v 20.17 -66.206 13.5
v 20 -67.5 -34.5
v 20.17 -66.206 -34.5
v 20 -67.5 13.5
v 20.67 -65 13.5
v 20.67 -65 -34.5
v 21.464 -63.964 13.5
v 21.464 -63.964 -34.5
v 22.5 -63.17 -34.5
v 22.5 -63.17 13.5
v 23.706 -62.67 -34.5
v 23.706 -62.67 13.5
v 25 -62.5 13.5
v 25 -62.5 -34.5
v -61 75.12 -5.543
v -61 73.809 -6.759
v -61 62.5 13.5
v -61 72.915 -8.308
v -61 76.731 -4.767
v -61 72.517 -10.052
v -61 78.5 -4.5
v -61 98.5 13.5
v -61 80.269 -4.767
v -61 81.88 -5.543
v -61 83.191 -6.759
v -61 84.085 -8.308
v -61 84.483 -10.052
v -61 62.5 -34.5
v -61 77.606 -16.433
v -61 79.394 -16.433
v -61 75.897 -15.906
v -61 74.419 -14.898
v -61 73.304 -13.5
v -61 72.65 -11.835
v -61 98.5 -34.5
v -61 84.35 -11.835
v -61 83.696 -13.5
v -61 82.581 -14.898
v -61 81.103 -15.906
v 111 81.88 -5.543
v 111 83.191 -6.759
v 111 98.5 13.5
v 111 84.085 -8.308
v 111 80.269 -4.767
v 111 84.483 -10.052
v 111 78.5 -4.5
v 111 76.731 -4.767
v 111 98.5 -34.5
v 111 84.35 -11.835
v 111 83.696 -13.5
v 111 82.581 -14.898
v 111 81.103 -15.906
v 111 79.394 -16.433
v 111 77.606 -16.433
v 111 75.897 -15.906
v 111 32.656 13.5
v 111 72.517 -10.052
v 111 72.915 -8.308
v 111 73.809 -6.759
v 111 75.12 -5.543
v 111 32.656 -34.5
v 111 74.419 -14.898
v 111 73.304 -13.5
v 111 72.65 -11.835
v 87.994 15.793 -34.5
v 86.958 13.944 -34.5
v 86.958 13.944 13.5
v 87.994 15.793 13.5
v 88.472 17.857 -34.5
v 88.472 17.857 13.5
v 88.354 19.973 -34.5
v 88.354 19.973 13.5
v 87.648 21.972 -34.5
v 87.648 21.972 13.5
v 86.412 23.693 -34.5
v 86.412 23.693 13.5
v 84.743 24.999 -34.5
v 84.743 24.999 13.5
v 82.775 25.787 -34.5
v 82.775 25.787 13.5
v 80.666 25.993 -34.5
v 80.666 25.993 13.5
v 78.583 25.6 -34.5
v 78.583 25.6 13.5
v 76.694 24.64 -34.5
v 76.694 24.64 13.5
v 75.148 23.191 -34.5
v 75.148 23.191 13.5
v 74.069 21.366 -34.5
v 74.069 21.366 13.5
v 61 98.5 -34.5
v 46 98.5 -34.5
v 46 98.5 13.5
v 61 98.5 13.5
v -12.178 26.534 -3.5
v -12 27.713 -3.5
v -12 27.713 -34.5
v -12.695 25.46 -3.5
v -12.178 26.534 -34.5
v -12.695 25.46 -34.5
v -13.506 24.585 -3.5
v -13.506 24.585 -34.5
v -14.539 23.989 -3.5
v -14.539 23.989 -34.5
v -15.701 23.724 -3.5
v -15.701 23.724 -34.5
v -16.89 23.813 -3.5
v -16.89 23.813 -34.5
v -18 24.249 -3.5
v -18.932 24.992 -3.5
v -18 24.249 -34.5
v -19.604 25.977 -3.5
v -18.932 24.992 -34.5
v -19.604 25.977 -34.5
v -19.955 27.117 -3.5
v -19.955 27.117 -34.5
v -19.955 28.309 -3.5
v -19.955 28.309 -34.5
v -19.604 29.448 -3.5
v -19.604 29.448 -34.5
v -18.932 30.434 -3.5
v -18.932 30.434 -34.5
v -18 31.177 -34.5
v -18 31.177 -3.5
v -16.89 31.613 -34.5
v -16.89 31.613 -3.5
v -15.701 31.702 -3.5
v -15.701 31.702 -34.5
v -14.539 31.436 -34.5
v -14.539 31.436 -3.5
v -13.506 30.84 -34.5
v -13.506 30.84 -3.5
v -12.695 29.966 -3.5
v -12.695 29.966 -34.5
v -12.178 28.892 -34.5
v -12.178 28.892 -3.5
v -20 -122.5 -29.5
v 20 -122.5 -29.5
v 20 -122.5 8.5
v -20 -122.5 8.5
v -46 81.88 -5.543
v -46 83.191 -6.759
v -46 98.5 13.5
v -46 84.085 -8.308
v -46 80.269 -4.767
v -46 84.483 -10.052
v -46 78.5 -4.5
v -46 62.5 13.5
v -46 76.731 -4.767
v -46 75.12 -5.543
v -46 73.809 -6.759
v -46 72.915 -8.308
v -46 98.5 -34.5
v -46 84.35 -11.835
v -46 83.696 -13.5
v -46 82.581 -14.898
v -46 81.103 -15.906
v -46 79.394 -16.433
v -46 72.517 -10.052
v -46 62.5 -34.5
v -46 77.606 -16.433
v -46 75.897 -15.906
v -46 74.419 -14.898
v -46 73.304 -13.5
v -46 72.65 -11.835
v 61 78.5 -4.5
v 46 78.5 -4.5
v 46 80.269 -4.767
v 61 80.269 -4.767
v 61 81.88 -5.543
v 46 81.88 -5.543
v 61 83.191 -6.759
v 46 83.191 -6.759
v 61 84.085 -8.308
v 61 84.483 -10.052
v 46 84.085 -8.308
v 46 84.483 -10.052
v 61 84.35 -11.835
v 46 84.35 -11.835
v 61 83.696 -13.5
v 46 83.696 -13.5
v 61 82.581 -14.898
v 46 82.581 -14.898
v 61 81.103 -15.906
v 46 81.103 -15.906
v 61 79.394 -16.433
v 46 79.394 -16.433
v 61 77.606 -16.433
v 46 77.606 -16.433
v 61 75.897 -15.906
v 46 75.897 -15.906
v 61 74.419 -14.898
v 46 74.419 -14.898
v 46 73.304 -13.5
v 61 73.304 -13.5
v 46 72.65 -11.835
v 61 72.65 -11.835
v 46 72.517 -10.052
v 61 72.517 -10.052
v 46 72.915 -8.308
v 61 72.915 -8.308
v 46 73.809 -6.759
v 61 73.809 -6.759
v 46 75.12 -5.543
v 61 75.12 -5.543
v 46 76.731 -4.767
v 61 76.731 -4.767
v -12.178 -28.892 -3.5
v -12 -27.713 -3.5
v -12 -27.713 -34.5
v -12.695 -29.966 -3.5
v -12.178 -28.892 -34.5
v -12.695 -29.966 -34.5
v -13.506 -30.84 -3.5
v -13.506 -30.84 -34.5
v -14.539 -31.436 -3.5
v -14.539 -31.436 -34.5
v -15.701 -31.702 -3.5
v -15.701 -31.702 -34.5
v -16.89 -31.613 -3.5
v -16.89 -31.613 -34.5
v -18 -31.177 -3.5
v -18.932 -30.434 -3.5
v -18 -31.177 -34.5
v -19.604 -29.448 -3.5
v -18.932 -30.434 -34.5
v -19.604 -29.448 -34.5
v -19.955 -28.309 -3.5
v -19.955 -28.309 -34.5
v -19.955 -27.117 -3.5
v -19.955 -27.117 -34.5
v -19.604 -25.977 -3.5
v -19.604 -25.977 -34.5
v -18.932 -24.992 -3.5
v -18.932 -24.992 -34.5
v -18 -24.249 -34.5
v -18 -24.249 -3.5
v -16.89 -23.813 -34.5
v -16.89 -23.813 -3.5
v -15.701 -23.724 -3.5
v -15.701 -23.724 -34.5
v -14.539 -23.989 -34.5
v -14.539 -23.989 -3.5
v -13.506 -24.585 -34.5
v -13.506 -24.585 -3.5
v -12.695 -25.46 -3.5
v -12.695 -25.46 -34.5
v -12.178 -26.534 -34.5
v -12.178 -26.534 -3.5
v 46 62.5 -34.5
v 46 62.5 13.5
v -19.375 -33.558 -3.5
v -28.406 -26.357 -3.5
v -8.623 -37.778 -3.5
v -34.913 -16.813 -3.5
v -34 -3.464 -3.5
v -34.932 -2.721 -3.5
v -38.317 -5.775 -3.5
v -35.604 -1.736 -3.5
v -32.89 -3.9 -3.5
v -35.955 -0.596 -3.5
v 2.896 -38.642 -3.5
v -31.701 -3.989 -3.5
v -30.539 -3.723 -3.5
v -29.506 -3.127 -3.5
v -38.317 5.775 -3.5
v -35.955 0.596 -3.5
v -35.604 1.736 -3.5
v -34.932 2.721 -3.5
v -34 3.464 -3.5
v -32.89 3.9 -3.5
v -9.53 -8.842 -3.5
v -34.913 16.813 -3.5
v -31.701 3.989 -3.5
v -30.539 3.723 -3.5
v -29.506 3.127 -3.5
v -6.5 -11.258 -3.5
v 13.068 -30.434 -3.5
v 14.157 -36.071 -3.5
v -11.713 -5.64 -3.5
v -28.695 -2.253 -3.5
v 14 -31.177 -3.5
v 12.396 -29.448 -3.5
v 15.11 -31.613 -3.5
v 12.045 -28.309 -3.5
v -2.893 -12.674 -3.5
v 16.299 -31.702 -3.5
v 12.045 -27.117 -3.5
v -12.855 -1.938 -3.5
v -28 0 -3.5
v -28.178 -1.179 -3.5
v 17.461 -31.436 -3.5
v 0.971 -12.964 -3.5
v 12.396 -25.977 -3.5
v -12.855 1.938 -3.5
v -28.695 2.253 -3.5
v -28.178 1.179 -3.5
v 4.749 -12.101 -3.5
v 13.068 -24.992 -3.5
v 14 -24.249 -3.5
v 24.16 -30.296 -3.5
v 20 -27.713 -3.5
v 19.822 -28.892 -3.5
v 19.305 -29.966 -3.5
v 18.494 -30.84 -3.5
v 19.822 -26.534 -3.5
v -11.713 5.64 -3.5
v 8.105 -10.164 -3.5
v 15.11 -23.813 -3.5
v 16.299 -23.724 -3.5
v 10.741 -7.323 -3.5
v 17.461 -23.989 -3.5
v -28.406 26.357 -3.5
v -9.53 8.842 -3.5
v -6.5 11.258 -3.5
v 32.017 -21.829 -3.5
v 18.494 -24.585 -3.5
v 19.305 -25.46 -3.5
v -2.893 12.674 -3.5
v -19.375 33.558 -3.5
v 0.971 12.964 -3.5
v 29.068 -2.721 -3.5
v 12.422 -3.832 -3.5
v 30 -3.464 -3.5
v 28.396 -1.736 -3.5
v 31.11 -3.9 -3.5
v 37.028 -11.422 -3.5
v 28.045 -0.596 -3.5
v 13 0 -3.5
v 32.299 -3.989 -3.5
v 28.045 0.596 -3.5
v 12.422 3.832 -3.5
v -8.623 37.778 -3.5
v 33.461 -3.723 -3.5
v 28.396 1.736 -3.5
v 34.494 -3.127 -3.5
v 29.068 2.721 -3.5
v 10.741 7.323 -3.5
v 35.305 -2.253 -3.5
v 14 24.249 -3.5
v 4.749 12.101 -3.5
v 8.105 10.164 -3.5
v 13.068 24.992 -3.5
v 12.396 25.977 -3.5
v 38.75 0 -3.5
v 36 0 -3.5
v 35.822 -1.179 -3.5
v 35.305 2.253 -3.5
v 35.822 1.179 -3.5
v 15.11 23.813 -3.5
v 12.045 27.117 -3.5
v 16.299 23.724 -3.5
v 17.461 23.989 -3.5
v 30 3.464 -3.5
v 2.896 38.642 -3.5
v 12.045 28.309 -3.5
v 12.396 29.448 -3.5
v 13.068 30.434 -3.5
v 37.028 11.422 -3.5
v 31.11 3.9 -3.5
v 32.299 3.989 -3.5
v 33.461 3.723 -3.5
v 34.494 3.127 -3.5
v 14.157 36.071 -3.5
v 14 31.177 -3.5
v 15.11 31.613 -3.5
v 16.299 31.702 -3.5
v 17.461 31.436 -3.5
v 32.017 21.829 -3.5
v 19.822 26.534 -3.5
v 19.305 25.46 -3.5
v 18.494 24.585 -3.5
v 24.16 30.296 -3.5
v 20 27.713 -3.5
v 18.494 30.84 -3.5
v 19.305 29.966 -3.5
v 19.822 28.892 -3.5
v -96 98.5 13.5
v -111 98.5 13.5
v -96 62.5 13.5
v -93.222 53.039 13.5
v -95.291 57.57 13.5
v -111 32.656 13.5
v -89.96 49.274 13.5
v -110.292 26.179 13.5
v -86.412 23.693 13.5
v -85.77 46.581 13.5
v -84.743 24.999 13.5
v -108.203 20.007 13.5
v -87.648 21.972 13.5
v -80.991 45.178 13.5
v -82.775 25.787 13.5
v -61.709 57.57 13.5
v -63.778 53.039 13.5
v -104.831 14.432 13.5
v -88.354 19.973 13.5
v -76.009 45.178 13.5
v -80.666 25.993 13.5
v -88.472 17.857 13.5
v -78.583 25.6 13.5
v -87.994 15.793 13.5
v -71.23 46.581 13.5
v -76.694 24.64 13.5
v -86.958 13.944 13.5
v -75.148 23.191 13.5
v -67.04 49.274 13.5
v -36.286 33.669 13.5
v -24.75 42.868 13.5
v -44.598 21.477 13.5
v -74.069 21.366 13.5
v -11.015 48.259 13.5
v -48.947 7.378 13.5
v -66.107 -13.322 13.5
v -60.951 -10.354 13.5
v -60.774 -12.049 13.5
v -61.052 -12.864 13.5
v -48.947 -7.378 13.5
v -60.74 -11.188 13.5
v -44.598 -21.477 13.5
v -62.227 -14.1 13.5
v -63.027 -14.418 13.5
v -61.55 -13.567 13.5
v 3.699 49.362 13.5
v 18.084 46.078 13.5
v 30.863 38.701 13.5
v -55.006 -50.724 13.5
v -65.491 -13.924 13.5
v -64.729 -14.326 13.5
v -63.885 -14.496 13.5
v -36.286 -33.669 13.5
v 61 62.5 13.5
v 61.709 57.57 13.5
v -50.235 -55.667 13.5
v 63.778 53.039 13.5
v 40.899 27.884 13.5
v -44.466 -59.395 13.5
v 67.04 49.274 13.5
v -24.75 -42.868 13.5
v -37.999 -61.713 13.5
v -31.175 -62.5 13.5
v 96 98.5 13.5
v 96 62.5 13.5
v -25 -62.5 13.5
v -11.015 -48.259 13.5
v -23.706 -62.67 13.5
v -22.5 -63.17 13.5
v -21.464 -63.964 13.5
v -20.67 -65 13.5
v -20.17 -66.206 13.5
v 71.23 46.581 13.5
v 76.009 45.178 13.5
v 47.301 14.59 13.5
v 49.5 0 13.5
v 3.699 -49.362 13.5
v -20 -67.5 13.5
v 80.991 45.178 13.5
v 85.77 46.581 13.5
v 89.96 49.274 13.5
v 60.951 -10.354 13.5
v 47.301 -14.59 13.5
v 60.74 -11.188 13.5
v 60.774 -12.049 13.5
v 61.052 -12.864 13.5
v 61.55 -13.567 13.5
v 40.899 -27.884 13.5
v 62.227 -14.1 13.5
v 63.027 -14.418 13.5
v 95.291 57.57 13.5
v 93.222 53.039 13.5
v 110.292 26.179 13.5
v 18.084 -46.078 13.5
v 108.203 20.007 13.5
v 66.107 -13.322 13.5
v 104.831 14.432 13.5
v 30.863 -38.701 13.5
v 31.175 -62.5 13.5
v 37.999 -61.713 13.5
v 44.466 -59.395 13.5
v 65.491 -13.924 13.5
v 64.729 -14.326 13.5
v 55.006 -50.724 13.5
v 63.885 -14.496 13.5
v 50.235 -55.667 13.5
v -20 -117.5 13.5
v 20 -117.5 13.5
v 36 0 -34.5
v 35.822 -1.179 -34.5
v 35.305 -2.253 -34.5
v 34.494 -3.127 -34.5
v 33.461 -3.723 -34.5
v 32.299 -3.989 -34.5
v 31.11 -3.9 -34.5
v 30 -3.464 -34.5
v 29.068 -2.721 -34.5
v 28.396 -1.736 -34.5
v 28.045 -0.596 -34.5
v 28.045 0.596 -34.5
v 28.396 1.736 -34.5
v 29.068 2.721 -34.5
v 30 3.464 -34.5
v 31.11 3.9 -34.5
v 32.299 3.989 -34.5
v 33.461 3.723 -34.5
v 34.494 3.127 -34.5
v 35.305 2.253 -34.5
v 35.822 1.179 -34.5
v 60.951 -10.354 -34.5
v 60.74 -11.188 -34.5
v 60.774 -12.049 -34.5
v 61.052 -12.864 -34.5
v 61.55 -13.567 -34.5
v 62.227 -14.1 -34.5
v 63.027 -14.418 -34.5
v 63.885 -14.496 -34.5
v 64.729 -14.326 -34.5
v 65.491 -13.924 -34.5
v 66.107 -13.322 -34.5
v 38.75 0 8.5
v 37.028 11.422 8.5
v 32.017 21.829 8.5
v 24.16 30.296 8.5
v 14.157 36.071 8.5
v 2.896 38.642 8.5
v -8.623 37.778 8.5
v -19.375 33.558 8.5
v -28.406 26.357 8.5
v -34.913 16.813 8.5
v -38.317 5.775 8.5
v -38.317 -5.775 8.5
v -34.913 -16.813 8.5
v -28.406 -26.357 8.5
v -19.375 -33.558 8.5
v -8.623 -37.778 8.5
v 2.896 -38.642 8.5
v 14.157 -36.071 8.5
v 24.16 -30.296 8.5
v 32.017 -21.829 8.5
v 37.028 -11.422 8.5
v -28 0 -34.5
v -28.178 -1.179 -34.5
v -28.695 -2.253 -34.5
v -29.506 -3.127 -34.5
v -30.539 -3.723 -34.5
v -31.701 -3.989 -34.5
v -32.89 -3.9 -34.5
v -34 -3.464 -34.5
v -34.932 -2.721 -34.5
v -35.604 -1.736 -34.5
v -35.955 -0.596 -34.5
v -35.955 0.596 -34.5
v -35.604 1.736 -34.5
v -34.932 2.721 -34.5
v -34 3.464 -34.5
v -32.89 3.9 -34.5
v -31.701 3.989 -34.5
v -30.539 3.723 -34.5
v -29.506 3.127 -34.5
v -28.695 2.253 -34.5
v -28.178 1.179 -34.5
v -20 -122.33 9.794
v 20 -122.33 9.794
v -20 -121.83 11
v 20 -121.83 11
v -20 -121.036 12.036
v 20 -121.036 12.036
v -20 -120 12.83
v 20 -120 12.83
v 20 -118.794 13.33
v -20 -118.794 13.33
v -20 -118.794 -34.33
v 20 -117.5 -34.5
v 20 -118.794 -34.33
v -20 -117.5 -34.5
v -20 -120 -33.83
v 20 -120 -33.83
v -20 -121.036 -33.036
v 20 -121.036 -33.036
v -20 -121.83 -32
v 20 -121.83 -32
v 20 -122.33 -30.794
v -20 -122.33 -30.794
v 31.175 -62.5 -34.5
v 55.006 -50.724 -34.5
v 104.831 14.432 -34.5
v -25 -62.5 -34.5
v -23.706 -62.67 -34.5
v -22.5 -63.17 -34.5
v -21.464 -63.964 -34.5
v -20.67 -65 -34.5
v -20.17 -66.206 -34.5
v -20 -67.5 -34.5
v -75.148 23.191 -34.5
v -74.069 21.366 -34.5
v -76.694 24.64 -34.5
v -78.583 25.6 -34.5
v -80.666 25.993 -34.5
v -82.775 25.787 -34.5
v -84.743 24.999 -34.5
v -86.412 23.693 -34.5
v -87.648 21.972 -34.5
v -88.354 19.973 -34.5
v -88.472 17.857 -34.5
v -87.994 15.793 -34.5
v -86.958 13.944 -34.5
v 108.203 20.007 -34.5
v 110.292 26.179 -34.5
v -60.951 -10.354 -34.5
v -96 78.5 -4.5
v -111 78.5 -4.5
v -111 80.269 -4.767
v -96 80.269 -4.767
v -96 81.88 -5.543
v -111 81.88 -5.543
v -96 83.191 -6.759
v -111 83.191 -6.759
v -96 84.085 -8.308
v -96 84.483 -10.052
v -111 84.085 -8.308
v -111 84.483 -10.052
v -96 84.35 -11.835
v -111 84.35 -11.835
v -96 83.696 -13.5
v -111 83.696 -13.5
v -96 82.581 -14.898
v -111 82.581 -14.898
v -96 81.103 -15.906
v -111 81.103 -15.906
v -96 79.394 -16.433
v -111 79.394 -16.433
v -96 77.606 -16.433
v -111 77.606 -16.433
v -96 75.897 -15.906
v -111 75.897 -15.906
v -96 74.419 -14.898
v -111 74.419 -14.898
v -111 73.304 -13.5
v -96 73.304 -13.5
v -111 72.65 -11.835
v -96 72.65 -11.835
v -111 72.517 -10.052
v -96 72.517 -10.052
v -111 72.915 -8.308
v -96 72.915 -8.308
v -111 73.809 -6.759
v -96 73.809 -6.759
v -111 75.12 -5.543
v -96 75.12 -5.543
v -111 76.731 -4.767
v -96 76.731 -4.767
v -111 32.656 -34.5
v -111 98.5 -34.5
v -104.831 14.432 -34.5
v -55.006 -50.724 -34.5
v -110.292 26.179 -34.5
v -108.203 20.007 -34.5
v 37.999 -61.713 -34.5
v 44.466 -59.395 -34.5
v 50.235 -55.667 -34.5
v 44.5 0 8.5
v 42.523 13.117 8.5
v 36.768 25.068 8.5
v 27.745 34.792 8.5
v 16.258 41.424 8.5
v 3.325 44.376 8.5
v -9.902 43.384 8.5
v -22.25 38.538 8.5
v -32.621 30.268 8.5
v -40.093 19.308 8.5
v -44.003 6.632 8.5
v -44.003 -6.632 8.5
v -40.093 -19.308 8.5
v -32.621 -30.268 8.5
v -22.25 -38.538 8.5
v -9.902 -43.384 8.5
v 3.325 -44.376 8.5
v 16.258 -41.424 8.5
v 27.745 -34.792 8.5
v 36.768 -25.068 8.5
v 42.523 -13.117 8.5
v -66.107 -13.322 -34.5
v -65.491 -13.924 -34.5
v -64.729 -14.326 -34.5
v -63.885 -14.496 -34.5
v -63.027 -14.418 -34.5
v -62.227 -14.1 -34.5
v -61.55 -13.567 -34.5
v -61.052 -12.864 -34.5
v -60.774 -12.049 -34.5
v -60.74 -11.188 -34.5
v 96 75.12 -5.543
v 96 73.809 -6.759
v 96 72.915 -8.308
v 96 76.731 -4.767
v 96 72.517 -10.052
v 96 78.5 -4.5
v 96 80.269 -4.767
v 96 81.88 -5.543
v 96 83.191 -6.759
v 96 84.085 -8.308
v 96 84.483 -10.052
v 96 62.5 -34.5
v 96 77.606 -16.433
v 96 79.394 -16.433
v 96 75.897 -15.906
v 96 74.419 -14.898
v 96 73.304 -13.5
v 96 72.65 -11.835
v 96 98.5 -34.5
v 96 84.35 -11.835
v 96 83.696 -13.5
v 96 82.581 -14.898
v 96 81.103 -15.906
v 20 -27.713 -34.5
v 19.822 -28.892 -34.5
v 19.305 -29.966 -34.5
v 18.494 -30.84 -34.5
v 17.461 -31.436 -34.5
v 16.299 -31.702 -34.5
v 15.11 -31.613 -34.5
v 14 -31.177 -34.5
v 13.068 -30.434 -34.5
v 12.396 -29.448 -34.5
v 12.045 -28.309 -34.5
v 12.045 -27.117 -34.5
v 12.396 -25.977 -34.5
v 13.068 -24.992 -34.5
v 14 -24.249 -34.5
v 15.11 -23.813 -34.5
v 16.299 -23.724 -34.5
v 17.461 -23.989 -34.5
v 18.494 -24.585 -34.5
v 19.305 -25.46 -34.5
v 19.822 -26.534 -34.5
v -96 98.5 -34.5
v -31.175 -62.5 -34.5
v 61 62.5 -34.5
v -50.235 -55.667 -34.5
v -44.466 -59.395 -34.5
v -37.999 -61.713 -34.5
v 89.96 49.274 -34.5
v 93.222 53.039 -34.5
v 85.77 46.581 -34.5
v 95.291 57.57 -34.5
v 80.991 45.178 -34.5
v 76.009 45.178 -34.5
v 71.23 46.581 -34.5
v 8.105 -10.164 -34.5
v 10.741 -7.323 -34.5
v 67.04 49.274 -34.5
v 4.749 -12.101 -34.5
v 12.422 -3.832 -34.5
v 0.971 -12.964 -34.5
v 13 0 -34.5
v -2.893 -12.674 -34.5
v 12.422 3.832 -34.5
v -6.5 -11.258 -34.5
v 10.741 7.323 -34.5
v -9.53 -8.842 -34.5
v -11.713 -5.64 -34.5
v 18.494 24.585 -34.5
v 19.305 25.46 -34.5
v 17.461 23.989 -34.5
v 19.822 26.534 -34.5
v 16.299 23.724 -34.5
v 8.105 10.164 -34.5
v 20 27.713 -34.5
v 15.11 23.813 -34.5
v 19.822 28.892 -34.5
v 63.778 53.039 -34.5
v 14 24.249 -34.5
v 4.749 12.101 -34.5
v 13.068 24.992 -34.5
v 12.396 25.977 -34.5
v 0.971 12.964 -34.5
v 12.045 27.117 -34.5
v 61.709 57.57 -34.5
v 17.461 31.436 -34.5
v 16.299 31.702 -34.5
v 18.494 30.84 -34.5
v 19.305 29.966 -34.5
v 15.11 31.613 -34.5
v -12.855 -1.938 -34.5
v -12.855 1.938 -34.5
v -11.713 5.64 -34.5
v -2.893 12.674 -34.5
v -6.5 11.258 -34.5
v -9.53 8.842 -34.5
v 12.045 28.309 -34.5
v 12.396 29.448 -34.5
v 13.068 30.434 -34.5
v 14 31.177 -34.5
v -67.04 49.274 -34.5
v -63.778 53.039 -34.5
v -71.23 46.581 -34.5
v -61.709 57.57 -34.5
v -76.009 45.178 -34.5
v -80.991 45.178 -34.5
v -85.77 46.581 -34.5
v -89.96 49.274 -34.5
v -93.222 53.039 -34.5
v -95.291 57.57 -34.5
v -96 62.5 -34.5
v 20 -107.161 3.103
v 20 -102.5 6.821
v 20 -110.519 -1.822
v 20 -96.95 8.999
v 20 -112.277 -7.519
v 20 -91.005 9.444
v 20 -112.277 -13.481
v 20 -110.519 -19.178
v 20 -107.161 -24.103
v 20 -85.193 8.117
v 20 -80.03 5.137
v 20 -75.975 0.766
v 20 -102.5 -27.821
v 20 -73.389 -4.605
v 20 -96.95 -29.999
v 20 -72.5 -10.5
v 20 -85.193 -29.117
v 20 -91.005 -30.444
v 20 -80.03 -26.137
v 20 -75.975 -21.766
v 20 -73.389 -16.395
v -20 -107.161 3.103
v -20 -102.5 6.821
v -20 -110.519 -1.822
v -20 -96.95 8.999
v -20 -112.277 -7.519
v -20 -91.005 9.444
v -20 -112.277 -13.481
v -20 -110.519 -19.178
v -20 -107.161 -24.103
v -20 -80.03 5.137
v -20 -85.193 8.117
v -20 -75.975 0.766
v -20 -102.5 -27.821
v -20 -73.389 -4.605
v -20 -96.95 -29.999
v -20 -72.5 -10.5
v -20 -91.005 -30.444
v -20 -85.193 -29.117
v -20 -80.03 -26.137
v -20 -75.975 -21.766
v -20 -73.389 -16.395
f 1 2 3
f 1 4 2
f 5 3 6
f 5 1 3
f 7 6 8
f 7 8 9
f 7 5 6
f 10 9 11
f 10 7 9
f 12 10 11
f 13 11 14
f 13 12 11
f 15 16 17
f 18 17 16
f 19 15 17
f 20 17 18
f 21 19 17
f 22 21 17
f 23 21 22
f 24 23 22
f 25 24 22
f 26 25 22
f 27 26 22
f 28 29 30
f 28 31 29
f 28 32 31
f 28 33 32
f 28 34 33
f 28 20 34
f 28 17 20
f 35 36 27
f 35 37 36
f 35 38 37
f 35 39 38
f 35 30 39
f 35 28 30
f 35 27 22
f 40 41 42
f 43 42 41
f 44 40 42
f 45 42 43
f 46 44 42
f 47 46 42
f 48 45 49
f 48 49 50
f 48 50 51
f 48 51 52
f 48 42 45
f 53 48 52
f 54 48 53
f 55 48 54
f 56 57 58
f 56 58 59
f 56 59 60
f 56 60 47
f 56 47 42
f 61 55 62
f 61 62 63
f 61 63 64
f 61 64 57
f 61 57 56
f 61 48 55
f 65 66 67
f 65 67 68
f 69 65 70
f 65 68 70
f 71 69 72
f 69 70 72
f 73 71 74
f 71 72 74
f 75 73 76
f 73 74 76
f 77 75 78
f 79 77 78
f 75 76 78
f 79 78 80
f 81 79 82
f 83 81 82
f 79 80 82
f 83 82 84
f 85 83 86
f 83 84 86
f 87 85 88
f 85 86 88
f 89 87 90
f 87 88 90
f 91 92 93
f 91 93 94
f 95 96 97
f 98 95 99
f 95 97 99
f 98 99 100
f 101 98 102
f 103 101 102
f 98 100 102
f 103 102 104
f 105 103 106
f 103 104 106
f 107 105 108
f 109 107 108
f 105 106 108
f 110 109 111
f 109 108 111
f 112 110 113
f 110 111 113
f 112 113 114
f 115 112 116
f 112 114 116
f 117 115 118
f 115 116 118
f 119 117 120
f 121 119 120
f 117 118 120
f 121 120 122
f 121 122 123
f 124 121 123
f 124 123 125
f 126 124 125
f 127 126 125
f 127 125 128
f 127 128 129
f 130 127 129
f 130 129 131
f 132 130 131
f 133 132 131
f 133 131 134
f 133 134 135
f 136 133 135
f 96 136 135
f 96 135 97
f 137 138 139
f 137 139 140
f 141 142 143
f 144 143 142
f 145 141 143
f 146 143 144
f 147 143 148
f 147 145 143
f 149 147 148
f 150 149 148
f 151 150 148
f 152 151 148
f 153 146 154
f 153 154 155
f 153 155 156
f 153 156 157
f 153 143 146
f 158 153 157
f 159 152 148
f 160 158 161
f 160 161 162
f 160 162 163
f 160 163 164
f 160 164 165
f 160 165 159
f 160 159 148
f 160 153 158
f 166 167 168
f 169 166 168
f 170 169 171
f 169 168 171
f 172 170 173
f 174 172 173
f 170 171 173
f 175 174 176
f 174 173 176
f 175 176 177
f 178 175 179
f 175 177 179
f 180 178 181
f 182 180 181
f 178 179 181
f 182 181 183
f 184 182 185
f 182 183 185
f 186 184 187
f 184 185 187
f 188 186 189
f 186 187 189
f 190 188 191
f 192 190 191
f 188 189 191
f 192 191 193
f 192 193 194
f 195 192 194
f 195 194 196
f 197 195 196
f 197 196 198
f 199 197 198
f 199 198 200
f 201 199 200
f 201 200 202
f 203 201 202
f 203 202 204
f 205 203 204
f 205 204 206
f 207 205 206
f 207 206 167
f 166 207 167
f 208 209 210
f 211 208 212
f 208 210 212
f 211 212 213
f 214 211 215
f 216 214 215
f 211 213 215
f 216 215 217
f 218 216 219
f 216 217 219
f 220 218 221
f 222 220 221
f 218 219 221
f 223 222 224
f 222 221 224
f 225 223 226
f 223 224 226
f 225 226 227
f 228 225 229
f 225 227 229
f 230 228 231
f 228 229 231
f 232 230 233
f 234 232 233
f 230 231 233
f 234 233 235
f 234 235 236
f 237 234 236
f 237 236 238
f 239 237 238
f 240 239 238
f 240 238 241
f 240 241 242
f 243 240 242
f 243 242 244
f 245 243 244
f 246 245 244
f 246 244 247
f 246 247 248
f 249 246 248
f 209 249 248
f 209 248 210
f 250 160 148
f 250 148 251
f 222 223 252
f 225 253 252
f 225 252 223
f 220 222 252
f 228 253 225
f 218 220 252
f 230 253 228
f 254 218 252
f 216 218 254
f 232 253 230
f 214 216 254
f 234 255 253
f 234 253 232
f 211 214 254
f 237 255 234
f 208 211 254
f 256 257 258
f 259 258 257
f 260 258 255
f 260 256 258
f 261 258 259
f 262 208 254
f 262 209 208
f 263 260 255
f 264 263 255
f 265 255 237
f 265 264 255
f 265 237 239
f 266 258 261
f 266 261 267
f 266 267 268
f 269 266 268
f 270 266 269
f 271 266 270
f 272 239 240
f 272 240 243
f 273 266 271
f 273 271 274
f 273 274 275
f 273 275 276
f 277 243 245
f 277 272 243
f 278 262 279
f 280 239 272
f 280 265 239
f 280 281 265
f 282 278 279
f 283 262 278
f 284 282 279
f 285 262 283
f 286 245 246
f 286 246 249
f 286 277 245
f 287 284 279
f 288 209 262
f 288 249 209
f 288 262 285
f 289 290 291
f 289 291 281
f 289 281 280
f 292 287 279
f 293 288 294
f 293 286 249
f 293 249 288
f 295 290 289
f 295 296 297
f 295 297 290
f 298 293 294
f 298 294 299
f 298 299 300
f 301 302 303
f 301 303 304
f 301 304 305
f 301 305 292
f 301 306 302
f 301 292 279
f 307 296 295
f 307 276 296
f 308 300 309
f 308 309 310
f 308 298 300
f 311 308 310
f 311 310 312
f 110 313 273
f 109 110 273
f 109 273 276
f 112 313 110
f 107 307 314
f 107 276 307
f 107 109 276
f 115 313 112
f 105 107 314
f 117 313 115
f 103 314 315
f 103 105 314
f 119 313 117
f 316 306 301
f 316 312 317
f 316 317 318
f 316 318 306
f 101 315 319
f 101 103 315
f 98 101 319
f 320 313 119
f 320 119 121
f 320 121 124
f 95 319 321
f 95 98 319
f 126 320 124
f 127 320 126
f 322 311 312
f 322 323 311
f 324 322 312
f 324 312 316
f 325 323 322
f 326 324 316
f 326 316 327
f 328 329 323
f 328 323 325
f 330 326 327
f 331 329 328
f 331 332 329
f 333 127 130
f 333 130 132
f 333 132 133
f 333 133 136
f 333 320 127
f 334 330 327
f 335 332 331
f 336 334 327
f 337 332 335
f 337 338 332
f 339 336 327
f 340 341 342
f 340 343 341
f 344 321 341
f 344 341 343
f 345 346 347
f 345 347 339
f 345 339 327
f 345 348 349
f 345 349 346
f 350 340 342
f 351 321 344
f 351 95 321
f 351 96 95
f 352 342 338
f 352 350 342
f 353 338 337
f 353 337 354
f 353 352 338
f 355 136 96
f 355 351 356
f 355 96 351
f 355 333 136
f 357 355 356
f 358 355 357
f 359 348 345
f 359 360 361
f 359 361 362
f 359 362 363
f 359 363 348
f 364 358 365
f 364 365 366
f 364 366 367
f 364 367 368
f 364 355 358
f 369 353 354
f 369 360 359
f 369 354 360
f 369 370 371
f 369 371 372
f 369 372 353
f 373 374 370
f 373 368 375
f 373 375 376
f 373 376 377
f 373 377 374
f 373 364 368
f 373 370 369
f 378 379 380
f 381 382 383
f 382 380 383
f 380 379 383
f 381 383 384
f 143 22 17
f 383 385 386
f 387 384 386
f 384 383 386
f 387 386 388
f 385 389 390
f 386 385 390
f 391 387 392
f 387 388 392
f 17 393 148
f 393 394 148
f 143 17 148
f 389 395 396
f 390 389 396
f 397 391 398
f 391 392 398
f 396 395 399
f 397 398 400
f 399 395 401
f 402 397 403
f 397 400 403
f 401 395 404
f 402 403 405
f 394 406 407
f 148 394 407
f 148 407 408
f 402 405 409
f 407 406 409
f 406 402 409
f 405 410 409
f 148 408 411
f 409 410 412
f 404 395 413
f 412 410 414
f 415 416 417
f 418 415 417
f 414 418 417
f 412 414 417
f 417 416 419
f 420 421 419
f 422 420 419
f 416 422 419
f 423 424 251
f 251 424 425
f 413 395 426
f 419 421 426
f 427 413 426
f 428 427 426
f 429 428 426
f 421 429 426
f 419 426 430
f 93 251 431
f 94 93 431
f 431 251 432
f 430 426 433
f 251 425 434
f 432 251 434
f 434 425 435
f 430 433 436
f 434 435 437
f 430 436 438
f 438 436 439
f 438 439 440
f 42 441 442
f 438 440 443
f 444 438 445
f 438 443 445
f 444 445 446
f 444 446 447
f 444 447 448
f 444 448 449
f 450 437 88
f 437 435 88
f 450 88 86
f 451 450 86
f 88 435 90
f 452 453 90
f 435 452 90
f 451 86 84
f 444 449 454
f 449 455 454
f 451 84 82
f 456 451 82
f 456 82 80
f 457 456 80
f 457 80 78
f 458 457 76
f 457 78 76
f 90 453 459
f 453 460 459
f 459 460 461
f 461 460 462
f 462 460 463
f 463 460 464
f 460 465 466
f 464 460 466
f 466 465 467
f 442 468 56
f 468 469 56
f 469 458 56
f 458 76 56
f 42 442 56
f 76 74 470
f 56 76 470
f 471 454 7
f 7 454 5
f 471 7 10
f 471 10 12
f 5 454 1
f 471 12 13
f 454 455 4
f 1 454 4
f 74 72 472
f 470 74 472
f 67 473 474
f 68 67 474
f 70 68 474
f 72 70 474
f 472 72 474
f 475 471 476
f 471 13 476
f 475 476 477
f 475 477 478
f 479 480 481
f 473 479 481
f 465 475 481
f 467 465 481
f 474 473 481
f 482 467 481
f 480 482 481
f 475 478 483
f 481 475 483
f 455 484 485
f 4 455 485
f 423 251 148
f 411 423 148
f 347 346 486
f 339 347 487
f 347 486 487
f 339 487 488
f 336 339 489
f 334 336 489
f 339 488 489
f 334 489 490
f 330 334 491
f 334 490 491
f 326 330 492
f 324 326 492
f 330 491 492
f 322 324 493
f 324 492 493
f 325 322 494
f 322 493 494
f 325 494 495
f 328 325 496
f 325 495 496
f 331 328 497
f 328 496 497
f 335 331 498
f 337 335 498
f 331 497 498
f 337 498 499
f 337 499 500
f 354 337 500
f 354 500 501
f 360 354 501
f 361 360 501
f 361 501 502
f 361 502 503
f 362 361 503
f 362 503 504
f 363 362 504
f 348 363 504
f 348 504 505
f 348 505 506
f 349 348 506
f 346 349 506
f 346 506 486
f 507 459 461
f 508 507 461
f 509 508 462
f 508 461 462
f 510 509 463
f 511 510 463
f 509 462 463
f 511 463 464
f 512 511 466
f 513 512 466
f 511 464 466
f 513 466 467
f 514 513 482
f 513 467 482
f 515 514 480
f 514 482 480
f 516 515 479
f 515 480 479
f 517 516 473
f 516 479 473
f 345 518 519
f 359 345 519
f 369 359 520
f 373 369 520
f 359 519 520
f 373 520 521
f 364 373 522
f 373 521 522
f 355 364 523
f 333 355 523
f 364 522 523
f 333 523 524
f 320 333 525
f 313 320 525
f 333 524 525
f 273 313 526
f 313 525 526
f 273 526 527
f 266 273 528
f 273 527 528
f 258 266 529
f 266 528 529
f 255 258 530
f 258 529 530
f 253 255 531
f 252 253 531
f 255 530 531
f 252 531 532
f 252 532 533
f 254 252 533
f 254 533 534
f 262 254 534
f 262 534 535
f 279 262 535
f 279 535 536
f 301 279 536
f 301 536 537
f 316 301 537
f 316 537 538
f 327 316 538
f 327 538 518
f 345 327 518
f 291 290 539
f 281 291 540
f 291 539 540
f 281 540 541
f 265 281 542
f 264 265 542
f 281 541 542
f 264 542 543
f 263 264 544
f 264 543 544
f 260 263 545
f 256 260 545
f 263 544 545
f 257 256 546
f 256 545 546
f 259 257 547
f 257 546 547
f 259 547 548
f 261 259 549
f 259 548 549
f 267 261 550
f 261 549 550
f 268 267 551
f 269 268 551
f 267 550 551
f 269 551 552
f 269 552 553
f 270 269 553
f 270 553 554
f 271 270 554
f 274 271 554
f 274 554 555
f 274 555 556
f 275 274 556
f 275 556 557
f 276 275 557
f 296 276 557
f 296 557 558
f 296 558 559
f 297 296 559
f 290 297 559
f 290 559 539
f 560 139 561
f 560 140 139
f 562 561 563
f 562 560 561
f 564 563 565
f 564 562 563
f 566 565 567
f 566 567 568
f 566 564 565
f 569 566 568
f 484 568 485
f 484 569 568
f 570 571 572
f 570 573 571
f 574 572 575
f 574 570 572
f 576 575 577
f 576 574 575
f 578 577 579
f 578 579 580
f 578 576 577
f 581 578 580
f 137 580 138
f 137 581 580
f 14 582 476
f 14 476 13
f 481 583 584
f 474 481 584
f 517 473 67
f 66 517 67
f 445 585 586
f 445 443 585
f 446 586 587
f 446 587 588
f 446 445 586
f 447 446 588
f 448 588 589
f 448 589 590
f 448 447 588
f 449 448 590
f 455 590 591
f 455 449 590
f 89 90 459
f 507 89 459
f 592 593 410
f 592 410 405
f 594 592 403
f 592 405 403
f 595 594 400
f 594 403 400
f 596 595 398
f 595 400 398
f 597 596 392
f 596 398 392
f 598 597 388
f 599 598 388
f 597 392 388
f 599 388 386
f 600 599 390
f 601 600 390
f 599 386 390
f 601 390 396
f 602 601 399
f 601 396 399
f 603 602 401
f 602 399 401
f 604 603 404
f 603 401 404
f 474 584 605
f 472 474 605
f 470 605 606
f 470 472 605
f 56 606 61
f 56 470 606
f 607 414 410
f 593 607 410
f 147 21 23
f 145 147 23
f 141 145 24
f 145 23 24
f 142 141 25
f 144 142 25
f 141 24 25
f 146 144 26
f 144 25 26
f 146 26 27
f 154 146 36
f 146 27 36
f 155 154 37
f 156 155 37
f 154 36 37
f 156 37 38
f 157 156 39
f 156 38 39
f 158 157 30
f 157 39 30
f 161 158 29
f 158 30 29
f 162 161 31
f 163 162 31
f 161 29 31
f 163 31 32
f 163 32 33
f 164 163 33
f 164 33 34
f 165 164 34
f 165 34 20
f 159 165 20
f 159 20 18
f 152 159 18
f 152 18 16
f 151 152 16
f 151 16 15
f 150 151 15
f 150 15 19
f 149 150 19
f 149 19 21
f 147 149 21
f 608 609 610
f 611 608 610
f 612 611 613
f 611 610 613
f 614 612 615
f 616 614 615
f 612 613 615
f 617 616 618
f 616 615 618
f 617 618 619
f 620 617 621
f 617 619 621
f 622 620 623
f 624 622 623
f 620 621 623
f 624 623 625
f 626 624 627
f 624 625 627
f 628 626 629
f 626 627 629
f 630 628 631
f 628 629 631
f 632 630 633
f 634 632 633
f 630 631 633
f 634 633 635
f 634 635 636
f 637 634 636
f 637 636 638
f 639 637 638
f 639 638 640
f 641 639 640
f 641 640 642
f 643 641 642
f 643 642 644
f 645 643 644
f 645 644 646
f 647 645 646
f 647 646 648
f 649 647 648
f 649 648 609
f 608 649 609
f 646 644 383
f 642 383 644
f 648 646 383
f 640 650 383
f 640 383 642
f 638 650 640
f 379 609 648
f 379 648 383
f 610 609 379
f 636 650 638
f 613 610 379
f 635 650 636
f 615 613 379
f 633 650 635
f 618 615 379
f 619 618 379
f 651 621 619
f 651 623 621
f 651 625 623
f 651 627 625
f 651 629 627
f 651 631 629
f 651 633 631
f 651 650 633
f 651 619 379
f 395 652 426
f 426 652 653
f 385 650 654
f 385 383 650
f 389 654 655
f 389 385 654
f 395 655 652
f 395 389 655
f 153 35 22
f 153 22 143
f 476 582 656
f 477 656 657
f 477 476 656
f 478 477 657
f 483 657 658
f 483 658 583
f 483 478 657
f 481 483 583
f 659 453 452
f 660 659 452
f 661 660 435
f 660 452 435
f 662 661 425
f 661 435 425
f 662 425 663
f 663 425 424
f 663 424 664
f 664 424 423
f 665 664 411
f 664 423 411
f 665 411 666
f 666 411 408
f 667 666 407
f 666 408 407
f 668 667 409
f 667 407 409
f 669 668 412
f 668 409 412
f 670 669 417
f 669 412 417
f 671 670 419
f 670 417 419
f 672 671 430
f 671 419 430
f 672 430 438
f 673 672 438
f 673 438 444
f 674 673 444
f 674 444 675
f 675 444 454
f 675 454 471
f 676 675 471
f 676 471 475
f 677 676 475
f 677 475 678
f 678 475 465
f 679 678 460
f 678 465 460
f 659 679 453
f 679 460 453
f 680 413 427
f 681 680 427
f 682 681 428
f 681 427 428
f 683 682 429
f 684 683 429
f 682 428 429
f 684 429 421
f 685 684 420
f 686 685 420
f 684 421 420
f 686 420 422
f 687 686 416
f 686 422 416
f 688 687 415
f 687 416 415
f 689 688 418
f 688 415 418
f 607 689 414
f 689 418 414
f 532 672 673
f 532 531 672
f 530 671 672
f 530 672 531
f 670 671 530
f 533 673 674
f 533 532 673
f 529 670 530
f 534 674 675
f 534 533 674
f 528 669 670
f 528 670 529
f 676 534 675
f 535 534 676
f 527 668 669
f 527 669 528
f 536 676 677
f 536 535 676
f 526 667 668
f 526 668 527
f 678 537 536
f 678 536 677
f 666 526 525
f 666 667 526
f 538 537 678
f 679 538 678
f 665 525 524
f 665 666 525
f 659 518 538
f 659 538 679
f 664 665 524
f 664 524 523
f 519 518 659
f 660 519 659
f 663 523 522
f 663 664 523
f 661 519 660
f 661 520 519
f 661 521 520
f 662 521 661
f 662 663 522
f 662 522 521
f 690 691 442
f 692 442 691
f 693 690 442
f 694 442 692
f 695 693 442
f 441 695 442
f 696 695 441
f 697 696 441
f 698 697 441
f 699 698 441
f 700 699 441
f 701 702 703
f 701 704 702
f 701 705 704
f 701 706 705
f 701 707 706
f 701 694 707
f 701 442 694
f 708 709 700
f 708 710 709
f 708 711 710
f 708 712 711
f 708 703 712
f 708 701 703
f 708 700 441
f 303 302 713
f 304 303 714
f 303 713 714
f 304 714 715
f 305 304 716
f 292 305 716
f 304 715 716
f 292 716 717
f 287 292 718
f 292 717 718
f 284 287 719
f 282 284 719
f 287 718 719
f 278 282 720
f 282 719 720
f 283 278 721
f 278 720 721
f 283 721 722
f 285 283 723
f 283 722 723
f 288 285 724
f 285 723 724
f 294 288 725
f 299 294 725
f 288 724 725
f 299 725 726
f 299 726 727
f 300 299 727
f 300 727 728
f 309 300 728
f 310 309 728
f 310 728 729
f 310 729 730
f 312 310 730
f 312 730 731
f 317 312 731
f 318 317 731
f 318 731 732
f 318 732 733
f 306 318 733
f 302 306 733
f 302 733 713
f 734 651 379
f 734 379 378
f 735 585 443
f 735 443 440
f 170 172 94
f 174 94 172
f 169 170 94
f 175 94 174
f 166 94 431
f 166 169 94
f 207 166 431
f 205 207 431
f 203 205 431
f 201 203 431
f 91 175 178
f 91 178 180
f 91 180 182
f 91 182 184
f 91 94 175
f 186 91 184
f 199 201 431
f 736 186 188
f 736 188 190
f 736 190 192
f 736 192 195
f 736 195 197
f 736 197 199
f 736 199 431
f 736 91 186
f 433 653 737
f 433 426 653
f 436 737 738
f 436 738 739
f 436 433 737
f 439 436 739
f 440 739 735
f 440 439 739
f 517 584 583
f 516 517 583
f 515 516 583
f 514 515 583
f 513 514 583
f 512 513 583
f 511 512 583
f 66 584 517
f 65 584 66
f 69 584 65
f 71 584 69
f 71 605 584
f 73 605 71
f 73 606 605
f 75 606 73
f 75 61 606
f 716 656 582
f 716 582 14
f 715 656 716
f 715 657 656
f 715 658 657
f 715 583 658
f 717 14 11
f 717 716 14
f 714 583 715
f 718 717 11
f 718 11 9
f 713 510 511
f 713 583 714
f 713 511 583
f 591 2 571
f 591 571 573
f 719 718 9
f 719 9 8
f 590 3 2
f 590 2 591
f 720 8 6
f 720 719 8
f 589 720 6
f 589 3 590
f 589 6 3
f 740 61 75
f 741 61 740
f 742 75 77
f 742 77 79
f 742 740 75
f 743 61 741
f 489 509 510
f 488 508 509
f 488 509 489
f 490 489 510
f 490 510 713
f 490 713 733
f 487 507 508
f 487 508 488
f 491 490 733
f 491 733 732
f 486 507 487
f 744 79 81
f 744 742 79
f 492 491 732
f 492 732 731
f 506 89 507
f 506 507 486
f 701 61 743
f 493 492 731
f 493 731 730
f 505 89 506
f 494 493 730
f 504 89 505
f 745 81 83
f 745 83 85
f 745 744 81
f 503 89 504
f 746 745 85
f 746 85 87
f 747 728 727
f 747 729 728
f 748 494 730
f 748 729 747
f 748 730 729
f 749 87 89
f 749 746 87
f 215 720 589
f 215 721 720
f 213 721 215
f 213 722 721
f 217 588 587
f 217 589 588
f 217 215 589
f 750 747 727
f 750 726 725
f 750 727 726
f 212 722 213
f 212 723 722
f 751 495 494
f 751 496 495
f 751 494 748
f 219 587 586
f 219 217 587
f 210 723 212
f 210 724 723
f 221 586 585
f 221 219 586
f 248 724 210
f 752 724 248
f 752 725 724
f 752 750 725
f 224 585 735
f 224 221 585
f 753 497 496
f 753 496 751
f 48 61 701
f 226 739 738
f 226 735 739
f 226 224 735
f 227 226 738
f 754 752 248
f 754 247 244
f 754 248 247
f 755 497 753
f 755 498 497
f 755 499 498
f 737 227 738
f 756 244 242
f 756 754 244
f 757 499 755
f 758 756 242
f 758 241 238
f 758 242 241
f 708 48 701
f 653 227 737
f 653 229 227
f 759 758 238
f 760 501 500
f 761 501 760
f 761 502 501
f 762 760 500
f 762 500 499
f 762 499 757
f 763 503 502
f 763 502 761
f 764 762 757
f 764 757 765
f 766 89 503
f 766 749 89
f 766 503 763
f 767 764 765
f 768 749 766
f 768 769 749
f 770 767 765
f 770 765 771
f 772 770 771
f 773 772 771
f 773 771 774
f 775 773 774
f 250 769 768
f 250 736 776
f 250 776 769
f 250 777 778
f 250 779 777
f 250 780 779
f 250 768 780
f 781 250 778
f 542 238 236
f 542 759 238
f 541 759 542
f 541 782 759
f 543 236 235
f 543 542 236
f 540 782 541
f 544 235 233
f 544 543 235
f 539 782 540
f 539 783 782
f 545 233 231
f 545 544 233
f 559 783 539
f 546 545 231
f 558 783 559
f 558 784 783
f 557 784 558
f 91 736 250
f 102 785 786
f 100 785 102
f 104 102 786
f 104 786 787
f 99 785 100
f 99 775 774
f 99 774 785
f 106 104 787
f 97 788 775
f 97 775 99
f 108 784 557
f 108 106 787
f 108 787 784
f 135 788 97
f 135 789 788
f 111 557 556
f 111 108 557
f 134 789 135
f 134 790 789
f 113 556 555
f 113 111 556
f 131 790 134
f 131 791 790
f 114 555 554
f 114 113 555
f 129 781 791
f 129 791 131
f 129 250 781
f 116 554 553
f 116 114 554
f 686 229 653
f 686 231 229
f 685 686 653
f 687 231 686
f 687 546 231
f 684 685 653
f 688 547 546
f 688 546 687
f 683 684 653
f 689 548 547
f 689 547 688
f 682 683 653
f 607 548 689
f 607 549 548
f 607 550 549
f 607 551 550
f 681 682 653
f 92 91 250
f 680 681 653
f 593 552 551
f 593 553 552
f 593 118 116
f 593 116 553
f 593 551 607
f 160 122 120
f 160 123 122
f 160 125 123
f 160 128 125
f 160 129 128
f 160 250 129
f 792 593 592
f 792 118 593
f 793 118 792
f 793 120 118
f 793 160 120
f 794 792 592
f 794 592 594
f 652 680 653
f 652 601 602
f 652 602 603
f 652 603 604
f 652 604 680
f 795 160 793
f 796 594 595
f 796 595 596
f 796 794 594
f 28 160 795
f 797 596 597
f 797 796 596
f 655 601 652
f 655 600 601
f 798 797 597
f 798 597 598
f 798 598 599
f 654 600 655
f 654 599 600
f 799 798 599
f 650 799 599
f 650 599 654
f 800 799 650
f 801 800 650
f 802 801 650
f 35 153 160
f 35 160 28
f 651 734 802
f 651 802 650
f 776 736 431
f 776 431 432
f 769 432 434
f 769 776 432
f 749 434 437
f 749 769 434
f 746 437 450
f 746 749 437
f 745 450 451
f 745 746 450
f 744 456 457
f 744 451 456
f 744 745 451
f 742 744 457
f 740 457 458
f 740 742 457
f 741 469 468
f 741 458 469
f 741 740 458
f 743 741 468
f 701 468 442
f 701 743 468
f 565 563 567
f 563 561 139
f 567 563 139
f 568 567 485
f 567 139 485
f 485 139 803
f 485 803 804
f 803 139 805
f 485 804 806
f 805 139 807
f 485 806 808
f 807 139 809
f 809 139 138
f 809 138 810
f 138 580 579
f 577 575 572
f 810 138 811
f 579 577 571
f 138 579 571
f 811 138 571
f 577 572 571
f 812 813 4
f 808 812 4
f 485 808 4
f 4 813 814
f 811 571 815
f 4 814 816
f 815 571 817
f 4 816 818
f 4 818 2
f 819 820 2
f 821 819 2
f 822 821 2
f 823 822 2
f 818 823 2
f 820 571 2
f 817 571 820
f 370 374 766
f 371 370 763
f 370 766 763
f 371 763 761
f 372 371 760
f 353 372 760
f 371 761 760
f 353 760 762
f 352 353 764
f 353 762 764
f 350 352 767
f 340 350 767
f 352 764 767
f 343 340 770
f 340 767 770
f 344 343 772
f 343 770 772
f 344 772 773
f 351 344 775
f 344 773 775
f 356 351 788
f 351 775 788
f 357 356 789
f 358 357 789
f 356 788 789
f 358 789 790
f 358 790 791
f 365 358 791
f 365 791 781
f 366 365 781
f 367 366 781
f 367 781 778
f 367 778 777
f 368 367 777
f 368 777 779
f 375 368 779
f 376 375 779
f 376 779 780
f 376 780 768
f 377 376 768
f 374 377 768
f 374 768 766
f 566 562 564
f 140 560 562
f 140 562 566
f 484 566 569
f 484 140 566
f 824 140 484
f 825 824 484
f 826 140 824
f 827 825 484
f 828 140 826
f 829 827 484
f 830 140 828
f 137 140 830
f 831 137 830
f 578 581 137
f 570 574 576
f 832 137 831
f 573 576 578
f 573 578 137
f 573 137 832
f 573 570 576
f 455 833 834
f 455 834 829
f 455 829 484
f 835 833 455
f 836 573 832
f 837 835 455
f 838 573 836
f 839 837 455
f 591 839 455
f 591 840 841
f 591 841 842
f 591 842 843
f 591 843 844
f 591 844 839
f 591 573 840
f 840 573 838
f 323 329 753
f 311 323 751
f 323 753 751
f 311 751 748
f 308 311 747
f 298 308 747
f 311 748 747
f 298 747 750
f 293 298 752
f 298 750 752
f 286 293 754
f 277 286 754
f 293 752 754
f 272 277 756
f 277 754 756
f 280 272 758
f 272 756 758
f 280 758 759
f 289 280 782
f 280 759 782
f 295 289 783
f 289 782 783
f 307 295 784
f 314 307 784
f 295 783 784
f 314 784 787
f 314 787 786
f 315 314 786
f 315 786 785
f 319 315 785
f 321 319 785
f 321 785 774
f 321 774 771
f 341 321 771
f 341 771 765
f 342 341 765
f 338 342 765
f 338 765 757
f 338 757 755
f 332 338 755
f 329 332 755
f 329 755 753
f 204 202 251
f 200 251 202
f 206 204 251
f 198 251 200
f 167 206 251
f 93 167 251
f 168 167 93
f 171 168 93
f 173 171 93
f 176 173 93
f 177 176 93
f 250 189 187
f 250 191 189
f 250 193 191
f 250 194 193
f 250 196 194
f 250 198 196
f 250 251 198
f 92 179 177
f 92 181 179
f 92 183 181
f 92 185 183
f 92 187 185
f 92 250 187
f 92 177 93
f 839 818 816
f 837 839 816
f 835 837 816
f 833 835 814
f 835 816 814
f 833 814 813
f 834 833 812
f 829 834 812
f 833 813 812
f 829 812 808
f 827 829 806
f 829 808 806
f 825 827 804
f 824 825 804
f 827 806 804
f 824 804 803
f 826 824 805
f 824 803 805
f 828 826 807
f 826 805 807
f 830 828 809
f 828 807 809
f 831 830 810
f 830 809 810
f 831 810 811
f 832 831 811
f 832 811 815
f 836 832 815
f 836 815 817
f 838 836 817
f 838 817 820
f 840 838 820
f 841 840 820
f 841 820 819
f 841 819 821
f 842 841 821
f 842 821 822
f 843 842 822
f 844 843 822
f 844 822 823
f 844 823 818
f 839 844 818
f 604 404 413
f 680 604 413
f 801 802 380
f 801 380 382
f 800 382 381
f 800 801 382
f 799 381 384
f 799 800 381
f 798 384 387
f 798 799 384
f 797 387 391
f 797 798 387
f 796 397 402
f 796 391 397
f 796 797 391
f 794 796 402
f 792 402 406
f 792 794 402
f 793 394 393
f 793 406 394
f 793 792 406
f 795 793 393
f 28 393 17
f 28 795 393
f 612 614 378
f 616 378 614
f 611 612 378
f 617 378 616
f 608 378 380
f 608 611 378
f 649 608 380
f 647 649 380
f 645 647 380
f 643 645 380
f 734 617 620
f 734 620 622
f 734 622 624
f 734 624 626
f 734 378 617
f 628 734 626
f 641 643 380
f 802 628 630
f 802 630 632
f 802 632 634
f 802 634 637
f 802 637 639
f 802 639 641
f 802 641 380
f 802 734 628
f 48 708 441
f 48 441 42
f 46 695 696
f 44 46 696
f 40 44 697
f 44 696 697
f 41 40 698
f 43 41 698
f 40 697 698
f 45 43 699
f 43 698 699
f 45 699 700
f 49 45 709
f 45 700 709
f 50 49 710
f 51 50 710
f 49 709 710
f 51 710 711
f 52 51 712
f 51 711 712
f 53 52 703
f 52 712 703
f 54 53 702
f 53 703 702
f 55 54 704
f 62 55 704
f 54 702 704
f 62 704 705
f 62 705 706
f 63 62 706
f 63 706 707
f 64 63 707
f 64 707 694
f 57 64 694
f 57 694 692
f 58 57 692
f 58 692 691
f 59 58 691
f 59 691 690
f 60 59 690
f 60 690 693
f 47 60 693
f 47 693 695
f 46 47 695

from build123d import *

# Parameters (mm, degrees)
DODANIE_WYCI_GNI_CIE1_DEPTH      = 13.5
DODANIE_WYCI_GNI_CIE1_DEPTH_BACK = 13.5
SZKIC1_W                         = 222
SZKIC1_H                         = 125
SZKIC1_R                         = 13
SZKIC1_R_2                       = 4
SZKIC4_W                         = 15
SZKIC4_H                         = 27
DODANIE_WYCI_GNI_CIE4_DEPTH      = 36
SZKIC13_R                        = 38.75
WYTNIJ_WYCI_GNI_CIE4_DEPTH       = 17
SZKIC15_R                        = 44.5
WYTNIJ_WYCI_GNI_CIE5_DEPTH       = 5
POCHYLENIE1_ANGLE                = 45
DODANIE_WYCI_GNI_CIE6_START      = 21
SZKIC16_R                        = 13
SZKIC16_R_2                      = 4
DODANIE_WYCI_GNI_CIE6_DEPTH      = 21
SZKIC5_R                         = 6
WYTNIJ_WYCI_GNI_CIE3_DEPTH       = 246.308988828
WYTNIJ_WYCI_GNI_CIE6_DEPTH       = 156.971952607
ZAOKR_GLENIE1_R                  = 30
ZAOKR_GLENIE2_R                  = 30
SZKIC19_W                        = 40
SZKIC19_H                        = 60
DODANIE_WYCI_GNI_CIE7_DEPTH      = 48
WYTNIJ_WYCI_GNI_CIE7_REACH       = 184.64
SZKIC23_R                        = 20
WYTNIJ_WYCI_GNI_CIE8_REACH       = 174.137
ZAOKR_GLENIE4_R                  = 5
ZAOKR_GLENIE5_R                  = 5
WYTNIJ_WYCI_GNI_CIE9_DEPTH       = 48


with BuildPart() as part:
    # Szkic1 → Dodanie-wyciągnięcie1 (new, two sides: drawn at the far end of the back side and taken through both)
    with BuildSketch(Plane.XY.offset(-DODANIE_WYCI_GNI_CIE1_DEPTH_BACK)):
        Rectangle(SZKIC1_W, SZKIC1_H)
        Circle(SZKIC1_R, mode=Mode.SUBTRACT)
        with Locations((-32, 0)):
            Circle(SZKIC1_R_2, mode=Mode.SUBTRACT)
        with Locations((-16, 27.712812921)):
            Circle(SZKIC1_R_2, mode=Mode.SUBTRACT)
        with Locations((16, 27.712812921)):
            Circle(SZKIC1_R_2, mode=Mode.SUBTRACT)
        with Locations((32, 0)):
            Circle(SZKIC1_R_2, mode=Mode.SUBTRACT)
        with Locations((16, -27.712812921)):
            Circle(SZKIC1_R_2, mode=Mode.SUBTRACT)
        with Locations((-16, -27.712812921)):
            Circle(SZKIC1_R_2, mode=Mode.SUBTRACT)
    extrude(amount=DODANIE_WYCI_GNI_CIE1_DEPTH + DODANIE_WYCI_GNI_CIE1_DEPTH_BACK)

    # Szkic4 → Dodanie-wyciągnięcie4 (add)
    with BuildSketch(Plane(origin=(0, 62.5, 0), x_dir=(1, 0, 0), z_dir=(0, 1, 0))):
        with Locations((-103.5, 0)):
            Rectangle(SZKIC4_W, SZKIC4_H)
        with Locations((-53.5, 0)):
            Rectangle(SZKIC4_W, SZKIC4_H)
        with Locations((53.5, 0)):
            Rectangle(SZKIC4_W, SZKIC4_H)
        with Locations((103.5, 0)):
            Rectangle(SZKIC4_W, SZKIC4_H)
    extrude(amount=DODANIE_WYCI_GNI_CIE4_DEPTH)

    # Szkic13 → Wytnij-wyciągnięcie4 (cut)
    with BuildSketch(Plane.XY.offset(13.5)):
        Circle(SZKIC13_R)
    extrude(amount=-WYTNIJ_WYCI_GNI_CIE4_DEPTH, mode=Mode.SUBTRACT)

    # Szkic15 → Wytnij-wyciągnięcie5 (cut)
    with BuildSketch(Plane.XY.offset(13.5)):
        Circle(SZKIC15_R)
    extrude(amount=-WYTNIJ_WYCI_GNI_CIE5_DEPTH, mode=Mode.SUBTRACT)

    # Pochylenie1
    pochylenie1_faces = [part.faces().sort_by_distance(p)[0] for p in [
        (-44.5, 0, 11),
    ]]
    draft(pochylenie1_faces, Plane.XY.offset(8.5), POCHYLENIE1_ANGLE)

    # Szkic16 → Dodanie-wyciągnięcie6 (add)
    with BuildSketch(Plane(origin=(0, 0, -13.5), x_dir=(-1, 0, 0), z_dir=(0, 0, -1)).offset(DODANIE_WYCI_GNI_CIE6_START)):
        Polygon((-111, 98.5), (-111, -62.5), (111, -62.5), (111, 98.5), (96, 98.5), (96, 62.5), (61, 62.5), (61, 98.5), (46, 98.5), (46, 62.5), (-46, 62.5), (-46, 98.5), (-61, 98.5), (-61, 62.5), (-96, 62.5), (-96, 98.5), align=None)
        with Locations(Location((0, 0, 0), (0, 0, 180))):
            Circle(SZKIC16_R, mode=Mode.SUBTRACT)
        with Locations(Location((32, 0, 0), (0, 0, 180))):
            Circle(SZKIC16_R_2, mode=Mode.SUBTRACT)
        with Locations(Location((16, 27.712812921, 0), (0, 0, 180))):
            Circle(SZKIC16_R_2, mode=Mode.SUBTRACT)
        with Locations(Location((-16, 27.712812921, 0), (0, 0, 180))):
            Circle(SZKIC16_R_2, mode=Mode.SUBTRACT)
        with Locations(Location((-32, 0, 0), (0, 0, 180))):
            Circle(SZKIC16_R_2, mode=Mode.SUBTRACT)
        with Locations(Location((-16, -27.712812921, 0), (0, 0, 180))):
            Circle(SZKIC16_R_2, mode=Mode.SUBTRACT)
        with Locations(Location((16, -27.712812921, 0), (0, 0, 180))):
            Circle(SZKIC16_R_2, mode=Mode.SUBTRACT)
    extrude(amount=-DODANIE_WYCI_GNI_CIE6_DEPTH)

    # Szkic5 → Wytnij-wyciągnięcie3 (cut, through all)
    with BuildSketch(Plane.ZY.offset(111)):
        with Locations((-10.5, 78.5)):
            Circle(SZKIC5_R)
    extrude(amount=-WYTNIJ_WYCI_GNI_CIE3_DEPTH, mode=Mode.SUBTRACT)

    # Szkic18 → Wytnij-wyciągnięcie6 (cut, through all)
    with BuildSketch(Plane(origin=(0, 0, -34.5), x_dir=(-1, 0, 0), z_dir=(0, 0, -1))):
        Polygon((111, 22.5), (46, -62.5), (111, -62.5), align=None)
        Polygon((-111, -62.5), (-46, -62.5), (-111, 22.5), align=None)
    extrude(amount=-WYTNIJ_WYCI_GNI_CIE6_DEPTH, mode=Mode.SUBTRACT)

    # Zaokrąglenie1
    zaokr_glenie1_edges = [part.edges().sort_by_distance(p)[0] for p in [
        (-111, 22.5, -10.5),
    ]]
    fillet(zaokr_glenie1_edges, radius=ZAOKR_GLENIE1_R)

    # Zaokrąglenie2
    zaokr_glenie2_edges = [part.edges().sort_by_distance(p)[0] for p in [
        (-46, -62.5, -10.5),
        (111, 22.5, -10.5),
        (46, -62.5, -10.5),
    ]]
    fillet(zaokr_glenie2_edges, radius=ZAOKR_GLENIE2_R)

    # Szkic19 → Dodanie-wyciągnięcie7 (add)
    with BuildSketch(Plane(origin=(0, 0, -34.5), x_dir=(-1, 0, 0), z_dir=(0, 0, -1))):
        with Locations((0, -92.5)):
            Rectangle(SZKIC19_W, SZKIC19_H)
    extrude(amount=-DODANIE_WYCI_GNI_CIE7_DEPTH)

    # Szkic23 → Wytnij-wyciągnięcie7 (cut, up to next)
    with BuildSketch(Plane(origin=(20, 0, 0), x_dir=(0, 0, -1), z_dir=(1, 0, 0)), mode=Mode.PRIVATE) as wytnij_wyci_gni_cie7_sk1:
        with Locations(Location((10.5, -92.5, 0), (0, 0, 90))):
            Circle(SZKIC23_R)
    wytnij_wyci_gni_cie7_tool1 = extrude(wytnij_wyci_gni_cie7_sk1.sketch, amount=-WYTNIJ_WYCI_GNI_CIE7_REACH, mode=Mode.PRIVATE) & part.part
    add(wytnij_wyci_gni_cie7_tool1.solids().sort_by_distance((20, -92.5, -10.5))[0], mode=Mode.SUBTRACT)

    # Szkic24 → Wytnij-wyciągnięcie8 (cut, up to next)
    with BuildSketch(Plane(origin=(0, 0, -34.5), x_dir=(-1, 0, 0), z_dir=(0, 0, -1)), mode=Mode.PRIVATE) as wytnij_wyci_gni_cie8_sk1:
        with BuildLine():
            Line((-96, 62.5), (-61, 62.5))
            ThreePointArc((-61, 62.5), (-78.5, 45), (-96, 62.5))
        make_face()
    wytnij_wyci_gni_cie8_tool1 = extrude(wytnij_wyci_gni_cie8_sk1.sketch, amount=-WYTNIJ_WYCI_GNI_CIE8_REACH, mode=Mode.PRIVATE) & part.part
    # Szkic24 → Wytnij-wyciągnięcie8 (cut, up to next)
    with BuildSketch(Plane(origin=(0, 0, -34.5), x_dir=(-1, 0, 0), z_dir=(0, 0, -1)), mode=Mode.PRIVATE) as wytnij_wyci_gni_cie8_sk2:
        with BuildLine():
            Line((61, 62.5), (96, 62.5))
            ThreePointArc((96, 62.5), (78.5, 45), (61, 62.5))
        make_face()
    wytnij_wyci_gni_cie8_tool2 = extrude(wytnij_wyci_gni_cie8_sk2.sketch, amount=-WYTNIJ_WYCI_GNI_CIE8_REACH, mode=Mode.PRIVATE) & part.part
    add(wytnij_wyci_gni_cie8_tool1.solids().sort_by_distance((78.5, 55.072769, -34.5))[0], mode=Mode.SUBTRACT)
    add(wytnij_wyci_gni_cie8_tool2.solids().sort_by_distance((-78.5, 55.072769, -34.5))[0], mode=Mode.SUBTRACT)

    # Zaokrąglenie4
    zaokr_glenie4_edges = [part.edges().sort_by_distance(p)[0] for p in [
        (20, -62.5, -10.5),
        (-20, -62.5, -10.5),
    ]]
    fillet(zaokr_glenie4_edges, radius=ZAOKR_GLENIE4_R)

    # Zaokrąglenie5
    zaokr_glenie5_edges = [part.edges().sort_by_distance(p)[0] for p in [
        (0, -122.5, -34.5),
        (0, -122.5, 13.5),
    ]]
    fillet(zaokr_glenie5_edges, radius=ZAOKR_GLENIE5_R)

    # Szkic25 → Wytnij-wyciągnięcie9 (cut)
    with BuildSketch(Plane.XY.offset(13.5)):
        with BuildLine():
            Line((-60.951491344, -10.353512592), (-74.069286372, 21.36621852))
            ThreePointArc((-74.069286372, 21.36621852), (-84.742802137, 24.999340902), (-86.957683747, 13.944124193))
            Line((-86.957683747, 13.944124193), (-66.106850294, -13.322350323))
            ThreePointArc((-66.106850294, -13.322350323), (-62.22665594, -14.099736361), (-60.951491344, -10.353512592))
        make_face()
        with BuildLine():
            Line((66.106850294, -13.322350323), (86.957683747, 13.944124193))
            ThreePointArc((86.957683747, 13.944124193), (84.742802137, 24.999340902), (74.069286372, 21.36621852))
            Line((74.069286372, 21.36621852), (60.951491344, -10.353512592))
            ThreePointArc((60.951491344, -10.353512592), (62.22665594, -14.099736361), (66.106850294, -13.322350323))
        make_face()
    extrude(amount=-WYTNIJ_WYCI_GNI_CIE9_DEPTH, mode=Mode.SUBTRACT)


solid = part.part
